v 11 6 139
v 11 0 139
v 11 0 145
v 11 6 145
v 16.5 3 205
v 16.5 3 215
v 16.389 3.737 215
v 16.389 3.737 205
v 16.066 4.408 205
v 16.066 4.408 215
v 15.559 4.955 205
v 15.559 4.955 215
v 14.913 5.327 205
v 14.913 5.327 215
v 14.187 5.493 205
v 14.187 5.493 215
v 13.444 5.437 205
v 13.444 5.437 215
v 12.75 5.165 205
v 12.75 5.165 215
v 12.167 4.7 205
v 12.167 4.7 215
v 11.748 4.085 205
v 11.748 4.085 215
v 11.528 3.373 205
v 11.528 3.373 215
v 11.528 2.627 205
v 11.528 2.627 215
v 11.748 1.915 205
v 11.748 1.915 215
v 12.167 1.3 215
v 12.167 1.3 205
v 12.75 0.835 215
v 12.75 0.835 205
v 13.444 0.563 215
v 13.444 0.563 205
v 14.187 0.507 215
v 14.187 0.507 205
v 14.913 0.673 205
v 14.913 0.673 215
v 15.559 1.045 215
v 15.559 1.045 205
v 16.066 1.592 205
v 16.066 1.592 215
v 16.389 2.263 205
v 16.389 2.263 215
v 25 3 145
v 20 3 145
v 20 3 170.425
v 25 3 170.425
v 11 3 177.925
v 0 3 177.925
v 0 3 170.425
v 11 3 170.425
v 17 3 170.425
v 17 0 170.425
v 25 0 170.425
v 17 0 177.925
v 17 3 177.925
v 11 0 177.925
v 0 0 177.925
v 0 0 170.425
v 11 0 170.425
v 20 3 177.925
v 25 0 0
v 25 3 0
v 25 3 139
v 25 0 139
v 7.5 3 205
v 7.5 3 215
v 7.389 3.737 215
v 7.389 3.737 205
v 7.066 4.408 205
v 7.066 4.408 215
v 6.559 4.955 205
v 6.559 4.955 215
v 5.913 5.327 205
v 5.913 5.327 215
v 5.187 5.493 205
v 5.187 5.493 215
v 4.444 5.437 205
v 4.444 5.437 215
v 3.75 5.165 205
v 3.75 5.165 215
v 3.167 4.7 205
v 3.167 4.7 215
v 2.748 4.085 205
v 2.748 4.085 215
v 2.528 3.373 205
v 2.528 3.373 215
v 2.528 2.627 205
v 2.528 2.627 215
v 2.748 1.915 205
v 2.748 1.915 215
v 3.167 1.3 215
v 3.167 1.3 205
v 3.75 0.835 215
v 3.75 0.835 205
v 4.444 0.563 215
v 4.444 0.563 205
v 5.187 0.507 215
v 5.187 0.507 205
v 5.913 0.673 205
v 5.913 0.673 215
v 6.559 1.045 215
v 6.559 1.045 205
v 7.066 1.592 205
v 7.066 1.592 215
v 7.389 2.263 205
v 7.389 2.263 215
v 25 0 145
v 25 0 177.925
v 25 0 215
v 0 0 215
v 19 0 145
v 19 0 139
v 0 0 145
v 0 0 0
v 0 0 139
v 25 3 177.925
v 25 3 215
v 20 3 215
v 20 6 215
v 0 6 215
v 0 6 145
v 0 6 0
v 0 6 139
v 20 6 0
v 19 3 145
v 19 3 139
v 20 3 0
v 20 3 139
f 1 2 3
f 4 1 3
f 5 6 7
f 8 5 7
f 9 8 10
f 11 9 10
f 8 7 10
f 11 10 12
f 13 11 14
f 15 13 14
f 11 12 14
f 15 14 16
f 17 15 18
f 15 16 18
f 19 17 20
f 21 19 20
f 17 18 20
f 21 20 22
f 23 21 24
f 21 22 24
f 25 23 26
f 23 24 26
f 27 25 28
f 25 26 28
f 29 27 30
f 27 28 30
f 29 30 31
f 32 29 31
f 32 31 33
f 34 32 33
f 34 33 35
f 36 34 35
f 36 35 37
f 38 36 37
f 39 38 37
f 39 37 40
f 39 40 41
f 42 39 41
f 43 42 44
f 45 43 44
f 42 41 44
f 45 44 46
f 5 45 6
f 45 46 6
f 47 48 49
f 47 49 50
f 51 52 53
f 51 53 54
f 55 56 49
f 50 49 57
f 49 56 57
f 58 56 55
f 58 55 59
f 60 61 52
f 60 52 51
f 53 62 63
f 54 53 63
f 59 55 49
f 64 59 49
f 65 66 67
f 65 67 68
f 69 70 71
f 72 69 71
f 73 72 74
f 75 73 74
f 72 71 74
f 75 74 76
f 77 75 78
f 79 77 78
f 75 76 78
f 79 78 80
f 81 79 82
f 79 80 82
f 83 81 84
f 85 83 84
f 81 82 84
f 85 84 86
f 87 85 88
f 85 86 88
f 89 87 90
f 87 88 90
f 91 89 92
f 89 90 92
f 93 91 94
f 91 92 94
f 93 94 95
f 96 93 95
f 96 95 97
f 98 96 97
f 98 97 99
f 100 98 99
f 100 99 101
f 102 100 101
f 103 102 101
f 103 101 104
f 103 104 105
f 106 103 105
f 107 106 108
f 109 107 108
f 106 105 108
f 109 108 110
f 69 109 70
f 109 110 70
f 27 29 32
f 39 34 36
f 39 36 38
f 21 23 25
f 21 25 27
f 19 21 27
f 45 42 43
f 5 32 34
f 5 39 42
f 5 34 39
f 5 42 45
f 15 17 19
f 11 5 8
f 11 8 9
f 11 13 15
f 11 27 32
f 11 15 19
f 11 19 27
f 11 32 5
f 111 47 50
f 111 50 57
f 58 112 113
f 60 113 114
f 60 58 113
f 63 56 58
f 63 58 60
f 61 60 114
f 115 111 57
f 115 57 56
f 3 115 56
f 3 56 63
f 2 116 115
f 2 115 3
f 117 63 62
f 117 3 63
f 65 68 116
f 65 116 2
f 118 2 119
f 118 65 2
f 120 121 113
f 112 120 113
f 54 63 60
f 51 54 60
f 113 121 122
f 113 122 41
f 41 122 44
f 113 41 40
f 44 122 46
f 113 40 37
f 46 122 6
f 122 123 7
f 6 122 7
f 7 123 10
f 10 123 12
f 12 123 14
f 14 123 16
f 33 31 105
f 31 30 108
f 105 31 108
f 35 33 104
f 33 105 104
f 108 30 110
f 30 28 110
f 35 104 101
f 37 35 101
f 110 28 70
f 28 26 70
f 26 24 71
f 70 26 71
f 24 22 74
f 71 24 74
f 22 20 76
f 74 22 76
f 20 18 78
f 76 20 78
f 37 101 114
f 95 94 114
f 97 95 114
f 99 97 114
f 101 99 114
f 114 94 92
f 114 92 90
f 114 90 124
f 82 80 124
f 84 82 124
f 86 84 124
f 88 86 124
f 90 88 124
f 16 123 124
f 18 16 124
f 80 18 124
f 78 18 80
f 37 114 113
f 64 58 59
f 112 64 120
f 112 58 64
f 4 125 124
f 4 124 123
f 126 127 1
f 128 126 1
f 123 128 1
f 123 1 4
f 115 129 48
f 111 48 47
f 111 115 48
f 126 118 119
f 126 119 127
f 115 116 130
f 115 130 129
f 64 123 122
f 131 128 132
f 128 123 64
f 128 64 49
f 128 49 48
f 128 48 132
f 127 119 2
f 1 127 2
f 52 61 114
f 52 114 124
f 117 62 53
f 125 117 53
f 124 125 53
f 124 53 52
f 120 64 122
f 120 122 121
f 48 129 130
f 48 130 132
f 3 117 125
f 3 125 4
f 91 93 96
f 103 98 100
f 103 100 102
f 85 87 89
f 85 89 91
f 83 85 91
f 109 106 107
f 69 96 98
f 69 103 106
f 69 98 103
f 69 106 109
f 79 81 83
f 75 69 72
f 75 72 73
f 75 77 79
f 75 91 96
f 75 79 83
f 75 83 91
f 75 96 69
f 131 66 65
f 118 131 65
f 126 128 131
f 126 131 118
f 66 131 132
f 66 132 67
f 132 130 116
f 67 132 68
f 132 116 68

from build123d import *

# Parameters (mm, degrees)
BOSS_EXTRU_1_DEPTH         = 215
ESQUISSE3_W                = 8
ESQUISSE3_H                = 7.5
ESQUISSE3_W_2              = 11
ENL_V_MAT_EXTRU_1_DEPTH    = 3
ESQUISSE4_W                = 11
ESQUISSE4_H                = 6
ENL_V_MAT_EXTRU_2_DEPTH    = 217.531752868
ESQUISSE5_W                = 6
ESQUISSE5_H                = 6
ENL_V_MAT_EXTRU_3_DEPTH    = 3
ESQUISSE8_R                = 2.5
ENL_V_MAT_EXTRU_4_DEPTH    = 10
R_P_TITION_LIN_AIRE1_COUNT = 2
R_P_TITION_LIN_AIRE1_PITCH = 9


with BuildPart() as part:
    # Esquisse1 → Boss.-Extru.1 (new body)
    with BuildSketch(Plane.XY):
        Polygon((0, 0), (0, 6), (20, 6), (20, 3), (25, 3), (25, 0), align=None)
    extrude(amount=BOSS_EXTRU_1_DEPTH)

    # Esquisse3 → Enlèv. mat.-Extru.1 (cut)
    with BuildSketch(Plane.XZ):
        with Locations((21, 174.174574215)):
            Rectangle(ESQUISSE3_W, ESQUISSE3_H)
        with Locations((5.5, 174.174574215)):
            Rectangle(ESQUISSE3_W_2, ESQUISSE3_H)
    extrude(amount=-ENL_V_MAT_EXTRU_1_DEPTH, mode=Mode.SUBTRACT)

    # Esquisse4 → Enlèv. mat.-Extru.2 (cut, through all)
    with BuildSketch(Plane.XZ):
        with Locations((5.5, 142)):
            Rectangle(ESQUISSE4_W, ESQUISSE4_H)
    extrude(amount=-ENL_V_MAT_EXTRU_2_DEPTH, mode=Mode.SUBTRACT)

    # Esquisse5 → Enlèv. mat.-Extru.3 (cut)
    with BuildSketch(Plane.XZ):
        with Locations((22, 142)):
            Rectangle(ESQUISSE5_W, ESQUISSE5_H)
    extrude(amount=-ENL_V_MAT_EXTRU_3_DEPTH, mode=Mode.SUBTRACT)

    # Esquisse8 → Enlèv. mat.-Extru.4 (cut)
    with BuildSketch(Plane.XY.offset(215)):
        with Locations((5, 3)):
            Circle(ESQUISSE8_R)
    enl_v_mat_extru_4 = extrude(amount=-ENL_V_MAT_EXTRU_4_DEPTH, mode=Mode.SUBTRACT)

    # Répétition linéaire1: Enlèv. mat.-Extru.4 ×2
    with Locations(*[(i * R_P_TITION_LIN_AIRE1_PITCH, 0, 0) for i in range(1, R_P_TITION_LIN_AIRE1_COUNT)]):
        add(enl_v_mat_extru_4, mode=Mode.SUBTRACT)


solid = part.part
